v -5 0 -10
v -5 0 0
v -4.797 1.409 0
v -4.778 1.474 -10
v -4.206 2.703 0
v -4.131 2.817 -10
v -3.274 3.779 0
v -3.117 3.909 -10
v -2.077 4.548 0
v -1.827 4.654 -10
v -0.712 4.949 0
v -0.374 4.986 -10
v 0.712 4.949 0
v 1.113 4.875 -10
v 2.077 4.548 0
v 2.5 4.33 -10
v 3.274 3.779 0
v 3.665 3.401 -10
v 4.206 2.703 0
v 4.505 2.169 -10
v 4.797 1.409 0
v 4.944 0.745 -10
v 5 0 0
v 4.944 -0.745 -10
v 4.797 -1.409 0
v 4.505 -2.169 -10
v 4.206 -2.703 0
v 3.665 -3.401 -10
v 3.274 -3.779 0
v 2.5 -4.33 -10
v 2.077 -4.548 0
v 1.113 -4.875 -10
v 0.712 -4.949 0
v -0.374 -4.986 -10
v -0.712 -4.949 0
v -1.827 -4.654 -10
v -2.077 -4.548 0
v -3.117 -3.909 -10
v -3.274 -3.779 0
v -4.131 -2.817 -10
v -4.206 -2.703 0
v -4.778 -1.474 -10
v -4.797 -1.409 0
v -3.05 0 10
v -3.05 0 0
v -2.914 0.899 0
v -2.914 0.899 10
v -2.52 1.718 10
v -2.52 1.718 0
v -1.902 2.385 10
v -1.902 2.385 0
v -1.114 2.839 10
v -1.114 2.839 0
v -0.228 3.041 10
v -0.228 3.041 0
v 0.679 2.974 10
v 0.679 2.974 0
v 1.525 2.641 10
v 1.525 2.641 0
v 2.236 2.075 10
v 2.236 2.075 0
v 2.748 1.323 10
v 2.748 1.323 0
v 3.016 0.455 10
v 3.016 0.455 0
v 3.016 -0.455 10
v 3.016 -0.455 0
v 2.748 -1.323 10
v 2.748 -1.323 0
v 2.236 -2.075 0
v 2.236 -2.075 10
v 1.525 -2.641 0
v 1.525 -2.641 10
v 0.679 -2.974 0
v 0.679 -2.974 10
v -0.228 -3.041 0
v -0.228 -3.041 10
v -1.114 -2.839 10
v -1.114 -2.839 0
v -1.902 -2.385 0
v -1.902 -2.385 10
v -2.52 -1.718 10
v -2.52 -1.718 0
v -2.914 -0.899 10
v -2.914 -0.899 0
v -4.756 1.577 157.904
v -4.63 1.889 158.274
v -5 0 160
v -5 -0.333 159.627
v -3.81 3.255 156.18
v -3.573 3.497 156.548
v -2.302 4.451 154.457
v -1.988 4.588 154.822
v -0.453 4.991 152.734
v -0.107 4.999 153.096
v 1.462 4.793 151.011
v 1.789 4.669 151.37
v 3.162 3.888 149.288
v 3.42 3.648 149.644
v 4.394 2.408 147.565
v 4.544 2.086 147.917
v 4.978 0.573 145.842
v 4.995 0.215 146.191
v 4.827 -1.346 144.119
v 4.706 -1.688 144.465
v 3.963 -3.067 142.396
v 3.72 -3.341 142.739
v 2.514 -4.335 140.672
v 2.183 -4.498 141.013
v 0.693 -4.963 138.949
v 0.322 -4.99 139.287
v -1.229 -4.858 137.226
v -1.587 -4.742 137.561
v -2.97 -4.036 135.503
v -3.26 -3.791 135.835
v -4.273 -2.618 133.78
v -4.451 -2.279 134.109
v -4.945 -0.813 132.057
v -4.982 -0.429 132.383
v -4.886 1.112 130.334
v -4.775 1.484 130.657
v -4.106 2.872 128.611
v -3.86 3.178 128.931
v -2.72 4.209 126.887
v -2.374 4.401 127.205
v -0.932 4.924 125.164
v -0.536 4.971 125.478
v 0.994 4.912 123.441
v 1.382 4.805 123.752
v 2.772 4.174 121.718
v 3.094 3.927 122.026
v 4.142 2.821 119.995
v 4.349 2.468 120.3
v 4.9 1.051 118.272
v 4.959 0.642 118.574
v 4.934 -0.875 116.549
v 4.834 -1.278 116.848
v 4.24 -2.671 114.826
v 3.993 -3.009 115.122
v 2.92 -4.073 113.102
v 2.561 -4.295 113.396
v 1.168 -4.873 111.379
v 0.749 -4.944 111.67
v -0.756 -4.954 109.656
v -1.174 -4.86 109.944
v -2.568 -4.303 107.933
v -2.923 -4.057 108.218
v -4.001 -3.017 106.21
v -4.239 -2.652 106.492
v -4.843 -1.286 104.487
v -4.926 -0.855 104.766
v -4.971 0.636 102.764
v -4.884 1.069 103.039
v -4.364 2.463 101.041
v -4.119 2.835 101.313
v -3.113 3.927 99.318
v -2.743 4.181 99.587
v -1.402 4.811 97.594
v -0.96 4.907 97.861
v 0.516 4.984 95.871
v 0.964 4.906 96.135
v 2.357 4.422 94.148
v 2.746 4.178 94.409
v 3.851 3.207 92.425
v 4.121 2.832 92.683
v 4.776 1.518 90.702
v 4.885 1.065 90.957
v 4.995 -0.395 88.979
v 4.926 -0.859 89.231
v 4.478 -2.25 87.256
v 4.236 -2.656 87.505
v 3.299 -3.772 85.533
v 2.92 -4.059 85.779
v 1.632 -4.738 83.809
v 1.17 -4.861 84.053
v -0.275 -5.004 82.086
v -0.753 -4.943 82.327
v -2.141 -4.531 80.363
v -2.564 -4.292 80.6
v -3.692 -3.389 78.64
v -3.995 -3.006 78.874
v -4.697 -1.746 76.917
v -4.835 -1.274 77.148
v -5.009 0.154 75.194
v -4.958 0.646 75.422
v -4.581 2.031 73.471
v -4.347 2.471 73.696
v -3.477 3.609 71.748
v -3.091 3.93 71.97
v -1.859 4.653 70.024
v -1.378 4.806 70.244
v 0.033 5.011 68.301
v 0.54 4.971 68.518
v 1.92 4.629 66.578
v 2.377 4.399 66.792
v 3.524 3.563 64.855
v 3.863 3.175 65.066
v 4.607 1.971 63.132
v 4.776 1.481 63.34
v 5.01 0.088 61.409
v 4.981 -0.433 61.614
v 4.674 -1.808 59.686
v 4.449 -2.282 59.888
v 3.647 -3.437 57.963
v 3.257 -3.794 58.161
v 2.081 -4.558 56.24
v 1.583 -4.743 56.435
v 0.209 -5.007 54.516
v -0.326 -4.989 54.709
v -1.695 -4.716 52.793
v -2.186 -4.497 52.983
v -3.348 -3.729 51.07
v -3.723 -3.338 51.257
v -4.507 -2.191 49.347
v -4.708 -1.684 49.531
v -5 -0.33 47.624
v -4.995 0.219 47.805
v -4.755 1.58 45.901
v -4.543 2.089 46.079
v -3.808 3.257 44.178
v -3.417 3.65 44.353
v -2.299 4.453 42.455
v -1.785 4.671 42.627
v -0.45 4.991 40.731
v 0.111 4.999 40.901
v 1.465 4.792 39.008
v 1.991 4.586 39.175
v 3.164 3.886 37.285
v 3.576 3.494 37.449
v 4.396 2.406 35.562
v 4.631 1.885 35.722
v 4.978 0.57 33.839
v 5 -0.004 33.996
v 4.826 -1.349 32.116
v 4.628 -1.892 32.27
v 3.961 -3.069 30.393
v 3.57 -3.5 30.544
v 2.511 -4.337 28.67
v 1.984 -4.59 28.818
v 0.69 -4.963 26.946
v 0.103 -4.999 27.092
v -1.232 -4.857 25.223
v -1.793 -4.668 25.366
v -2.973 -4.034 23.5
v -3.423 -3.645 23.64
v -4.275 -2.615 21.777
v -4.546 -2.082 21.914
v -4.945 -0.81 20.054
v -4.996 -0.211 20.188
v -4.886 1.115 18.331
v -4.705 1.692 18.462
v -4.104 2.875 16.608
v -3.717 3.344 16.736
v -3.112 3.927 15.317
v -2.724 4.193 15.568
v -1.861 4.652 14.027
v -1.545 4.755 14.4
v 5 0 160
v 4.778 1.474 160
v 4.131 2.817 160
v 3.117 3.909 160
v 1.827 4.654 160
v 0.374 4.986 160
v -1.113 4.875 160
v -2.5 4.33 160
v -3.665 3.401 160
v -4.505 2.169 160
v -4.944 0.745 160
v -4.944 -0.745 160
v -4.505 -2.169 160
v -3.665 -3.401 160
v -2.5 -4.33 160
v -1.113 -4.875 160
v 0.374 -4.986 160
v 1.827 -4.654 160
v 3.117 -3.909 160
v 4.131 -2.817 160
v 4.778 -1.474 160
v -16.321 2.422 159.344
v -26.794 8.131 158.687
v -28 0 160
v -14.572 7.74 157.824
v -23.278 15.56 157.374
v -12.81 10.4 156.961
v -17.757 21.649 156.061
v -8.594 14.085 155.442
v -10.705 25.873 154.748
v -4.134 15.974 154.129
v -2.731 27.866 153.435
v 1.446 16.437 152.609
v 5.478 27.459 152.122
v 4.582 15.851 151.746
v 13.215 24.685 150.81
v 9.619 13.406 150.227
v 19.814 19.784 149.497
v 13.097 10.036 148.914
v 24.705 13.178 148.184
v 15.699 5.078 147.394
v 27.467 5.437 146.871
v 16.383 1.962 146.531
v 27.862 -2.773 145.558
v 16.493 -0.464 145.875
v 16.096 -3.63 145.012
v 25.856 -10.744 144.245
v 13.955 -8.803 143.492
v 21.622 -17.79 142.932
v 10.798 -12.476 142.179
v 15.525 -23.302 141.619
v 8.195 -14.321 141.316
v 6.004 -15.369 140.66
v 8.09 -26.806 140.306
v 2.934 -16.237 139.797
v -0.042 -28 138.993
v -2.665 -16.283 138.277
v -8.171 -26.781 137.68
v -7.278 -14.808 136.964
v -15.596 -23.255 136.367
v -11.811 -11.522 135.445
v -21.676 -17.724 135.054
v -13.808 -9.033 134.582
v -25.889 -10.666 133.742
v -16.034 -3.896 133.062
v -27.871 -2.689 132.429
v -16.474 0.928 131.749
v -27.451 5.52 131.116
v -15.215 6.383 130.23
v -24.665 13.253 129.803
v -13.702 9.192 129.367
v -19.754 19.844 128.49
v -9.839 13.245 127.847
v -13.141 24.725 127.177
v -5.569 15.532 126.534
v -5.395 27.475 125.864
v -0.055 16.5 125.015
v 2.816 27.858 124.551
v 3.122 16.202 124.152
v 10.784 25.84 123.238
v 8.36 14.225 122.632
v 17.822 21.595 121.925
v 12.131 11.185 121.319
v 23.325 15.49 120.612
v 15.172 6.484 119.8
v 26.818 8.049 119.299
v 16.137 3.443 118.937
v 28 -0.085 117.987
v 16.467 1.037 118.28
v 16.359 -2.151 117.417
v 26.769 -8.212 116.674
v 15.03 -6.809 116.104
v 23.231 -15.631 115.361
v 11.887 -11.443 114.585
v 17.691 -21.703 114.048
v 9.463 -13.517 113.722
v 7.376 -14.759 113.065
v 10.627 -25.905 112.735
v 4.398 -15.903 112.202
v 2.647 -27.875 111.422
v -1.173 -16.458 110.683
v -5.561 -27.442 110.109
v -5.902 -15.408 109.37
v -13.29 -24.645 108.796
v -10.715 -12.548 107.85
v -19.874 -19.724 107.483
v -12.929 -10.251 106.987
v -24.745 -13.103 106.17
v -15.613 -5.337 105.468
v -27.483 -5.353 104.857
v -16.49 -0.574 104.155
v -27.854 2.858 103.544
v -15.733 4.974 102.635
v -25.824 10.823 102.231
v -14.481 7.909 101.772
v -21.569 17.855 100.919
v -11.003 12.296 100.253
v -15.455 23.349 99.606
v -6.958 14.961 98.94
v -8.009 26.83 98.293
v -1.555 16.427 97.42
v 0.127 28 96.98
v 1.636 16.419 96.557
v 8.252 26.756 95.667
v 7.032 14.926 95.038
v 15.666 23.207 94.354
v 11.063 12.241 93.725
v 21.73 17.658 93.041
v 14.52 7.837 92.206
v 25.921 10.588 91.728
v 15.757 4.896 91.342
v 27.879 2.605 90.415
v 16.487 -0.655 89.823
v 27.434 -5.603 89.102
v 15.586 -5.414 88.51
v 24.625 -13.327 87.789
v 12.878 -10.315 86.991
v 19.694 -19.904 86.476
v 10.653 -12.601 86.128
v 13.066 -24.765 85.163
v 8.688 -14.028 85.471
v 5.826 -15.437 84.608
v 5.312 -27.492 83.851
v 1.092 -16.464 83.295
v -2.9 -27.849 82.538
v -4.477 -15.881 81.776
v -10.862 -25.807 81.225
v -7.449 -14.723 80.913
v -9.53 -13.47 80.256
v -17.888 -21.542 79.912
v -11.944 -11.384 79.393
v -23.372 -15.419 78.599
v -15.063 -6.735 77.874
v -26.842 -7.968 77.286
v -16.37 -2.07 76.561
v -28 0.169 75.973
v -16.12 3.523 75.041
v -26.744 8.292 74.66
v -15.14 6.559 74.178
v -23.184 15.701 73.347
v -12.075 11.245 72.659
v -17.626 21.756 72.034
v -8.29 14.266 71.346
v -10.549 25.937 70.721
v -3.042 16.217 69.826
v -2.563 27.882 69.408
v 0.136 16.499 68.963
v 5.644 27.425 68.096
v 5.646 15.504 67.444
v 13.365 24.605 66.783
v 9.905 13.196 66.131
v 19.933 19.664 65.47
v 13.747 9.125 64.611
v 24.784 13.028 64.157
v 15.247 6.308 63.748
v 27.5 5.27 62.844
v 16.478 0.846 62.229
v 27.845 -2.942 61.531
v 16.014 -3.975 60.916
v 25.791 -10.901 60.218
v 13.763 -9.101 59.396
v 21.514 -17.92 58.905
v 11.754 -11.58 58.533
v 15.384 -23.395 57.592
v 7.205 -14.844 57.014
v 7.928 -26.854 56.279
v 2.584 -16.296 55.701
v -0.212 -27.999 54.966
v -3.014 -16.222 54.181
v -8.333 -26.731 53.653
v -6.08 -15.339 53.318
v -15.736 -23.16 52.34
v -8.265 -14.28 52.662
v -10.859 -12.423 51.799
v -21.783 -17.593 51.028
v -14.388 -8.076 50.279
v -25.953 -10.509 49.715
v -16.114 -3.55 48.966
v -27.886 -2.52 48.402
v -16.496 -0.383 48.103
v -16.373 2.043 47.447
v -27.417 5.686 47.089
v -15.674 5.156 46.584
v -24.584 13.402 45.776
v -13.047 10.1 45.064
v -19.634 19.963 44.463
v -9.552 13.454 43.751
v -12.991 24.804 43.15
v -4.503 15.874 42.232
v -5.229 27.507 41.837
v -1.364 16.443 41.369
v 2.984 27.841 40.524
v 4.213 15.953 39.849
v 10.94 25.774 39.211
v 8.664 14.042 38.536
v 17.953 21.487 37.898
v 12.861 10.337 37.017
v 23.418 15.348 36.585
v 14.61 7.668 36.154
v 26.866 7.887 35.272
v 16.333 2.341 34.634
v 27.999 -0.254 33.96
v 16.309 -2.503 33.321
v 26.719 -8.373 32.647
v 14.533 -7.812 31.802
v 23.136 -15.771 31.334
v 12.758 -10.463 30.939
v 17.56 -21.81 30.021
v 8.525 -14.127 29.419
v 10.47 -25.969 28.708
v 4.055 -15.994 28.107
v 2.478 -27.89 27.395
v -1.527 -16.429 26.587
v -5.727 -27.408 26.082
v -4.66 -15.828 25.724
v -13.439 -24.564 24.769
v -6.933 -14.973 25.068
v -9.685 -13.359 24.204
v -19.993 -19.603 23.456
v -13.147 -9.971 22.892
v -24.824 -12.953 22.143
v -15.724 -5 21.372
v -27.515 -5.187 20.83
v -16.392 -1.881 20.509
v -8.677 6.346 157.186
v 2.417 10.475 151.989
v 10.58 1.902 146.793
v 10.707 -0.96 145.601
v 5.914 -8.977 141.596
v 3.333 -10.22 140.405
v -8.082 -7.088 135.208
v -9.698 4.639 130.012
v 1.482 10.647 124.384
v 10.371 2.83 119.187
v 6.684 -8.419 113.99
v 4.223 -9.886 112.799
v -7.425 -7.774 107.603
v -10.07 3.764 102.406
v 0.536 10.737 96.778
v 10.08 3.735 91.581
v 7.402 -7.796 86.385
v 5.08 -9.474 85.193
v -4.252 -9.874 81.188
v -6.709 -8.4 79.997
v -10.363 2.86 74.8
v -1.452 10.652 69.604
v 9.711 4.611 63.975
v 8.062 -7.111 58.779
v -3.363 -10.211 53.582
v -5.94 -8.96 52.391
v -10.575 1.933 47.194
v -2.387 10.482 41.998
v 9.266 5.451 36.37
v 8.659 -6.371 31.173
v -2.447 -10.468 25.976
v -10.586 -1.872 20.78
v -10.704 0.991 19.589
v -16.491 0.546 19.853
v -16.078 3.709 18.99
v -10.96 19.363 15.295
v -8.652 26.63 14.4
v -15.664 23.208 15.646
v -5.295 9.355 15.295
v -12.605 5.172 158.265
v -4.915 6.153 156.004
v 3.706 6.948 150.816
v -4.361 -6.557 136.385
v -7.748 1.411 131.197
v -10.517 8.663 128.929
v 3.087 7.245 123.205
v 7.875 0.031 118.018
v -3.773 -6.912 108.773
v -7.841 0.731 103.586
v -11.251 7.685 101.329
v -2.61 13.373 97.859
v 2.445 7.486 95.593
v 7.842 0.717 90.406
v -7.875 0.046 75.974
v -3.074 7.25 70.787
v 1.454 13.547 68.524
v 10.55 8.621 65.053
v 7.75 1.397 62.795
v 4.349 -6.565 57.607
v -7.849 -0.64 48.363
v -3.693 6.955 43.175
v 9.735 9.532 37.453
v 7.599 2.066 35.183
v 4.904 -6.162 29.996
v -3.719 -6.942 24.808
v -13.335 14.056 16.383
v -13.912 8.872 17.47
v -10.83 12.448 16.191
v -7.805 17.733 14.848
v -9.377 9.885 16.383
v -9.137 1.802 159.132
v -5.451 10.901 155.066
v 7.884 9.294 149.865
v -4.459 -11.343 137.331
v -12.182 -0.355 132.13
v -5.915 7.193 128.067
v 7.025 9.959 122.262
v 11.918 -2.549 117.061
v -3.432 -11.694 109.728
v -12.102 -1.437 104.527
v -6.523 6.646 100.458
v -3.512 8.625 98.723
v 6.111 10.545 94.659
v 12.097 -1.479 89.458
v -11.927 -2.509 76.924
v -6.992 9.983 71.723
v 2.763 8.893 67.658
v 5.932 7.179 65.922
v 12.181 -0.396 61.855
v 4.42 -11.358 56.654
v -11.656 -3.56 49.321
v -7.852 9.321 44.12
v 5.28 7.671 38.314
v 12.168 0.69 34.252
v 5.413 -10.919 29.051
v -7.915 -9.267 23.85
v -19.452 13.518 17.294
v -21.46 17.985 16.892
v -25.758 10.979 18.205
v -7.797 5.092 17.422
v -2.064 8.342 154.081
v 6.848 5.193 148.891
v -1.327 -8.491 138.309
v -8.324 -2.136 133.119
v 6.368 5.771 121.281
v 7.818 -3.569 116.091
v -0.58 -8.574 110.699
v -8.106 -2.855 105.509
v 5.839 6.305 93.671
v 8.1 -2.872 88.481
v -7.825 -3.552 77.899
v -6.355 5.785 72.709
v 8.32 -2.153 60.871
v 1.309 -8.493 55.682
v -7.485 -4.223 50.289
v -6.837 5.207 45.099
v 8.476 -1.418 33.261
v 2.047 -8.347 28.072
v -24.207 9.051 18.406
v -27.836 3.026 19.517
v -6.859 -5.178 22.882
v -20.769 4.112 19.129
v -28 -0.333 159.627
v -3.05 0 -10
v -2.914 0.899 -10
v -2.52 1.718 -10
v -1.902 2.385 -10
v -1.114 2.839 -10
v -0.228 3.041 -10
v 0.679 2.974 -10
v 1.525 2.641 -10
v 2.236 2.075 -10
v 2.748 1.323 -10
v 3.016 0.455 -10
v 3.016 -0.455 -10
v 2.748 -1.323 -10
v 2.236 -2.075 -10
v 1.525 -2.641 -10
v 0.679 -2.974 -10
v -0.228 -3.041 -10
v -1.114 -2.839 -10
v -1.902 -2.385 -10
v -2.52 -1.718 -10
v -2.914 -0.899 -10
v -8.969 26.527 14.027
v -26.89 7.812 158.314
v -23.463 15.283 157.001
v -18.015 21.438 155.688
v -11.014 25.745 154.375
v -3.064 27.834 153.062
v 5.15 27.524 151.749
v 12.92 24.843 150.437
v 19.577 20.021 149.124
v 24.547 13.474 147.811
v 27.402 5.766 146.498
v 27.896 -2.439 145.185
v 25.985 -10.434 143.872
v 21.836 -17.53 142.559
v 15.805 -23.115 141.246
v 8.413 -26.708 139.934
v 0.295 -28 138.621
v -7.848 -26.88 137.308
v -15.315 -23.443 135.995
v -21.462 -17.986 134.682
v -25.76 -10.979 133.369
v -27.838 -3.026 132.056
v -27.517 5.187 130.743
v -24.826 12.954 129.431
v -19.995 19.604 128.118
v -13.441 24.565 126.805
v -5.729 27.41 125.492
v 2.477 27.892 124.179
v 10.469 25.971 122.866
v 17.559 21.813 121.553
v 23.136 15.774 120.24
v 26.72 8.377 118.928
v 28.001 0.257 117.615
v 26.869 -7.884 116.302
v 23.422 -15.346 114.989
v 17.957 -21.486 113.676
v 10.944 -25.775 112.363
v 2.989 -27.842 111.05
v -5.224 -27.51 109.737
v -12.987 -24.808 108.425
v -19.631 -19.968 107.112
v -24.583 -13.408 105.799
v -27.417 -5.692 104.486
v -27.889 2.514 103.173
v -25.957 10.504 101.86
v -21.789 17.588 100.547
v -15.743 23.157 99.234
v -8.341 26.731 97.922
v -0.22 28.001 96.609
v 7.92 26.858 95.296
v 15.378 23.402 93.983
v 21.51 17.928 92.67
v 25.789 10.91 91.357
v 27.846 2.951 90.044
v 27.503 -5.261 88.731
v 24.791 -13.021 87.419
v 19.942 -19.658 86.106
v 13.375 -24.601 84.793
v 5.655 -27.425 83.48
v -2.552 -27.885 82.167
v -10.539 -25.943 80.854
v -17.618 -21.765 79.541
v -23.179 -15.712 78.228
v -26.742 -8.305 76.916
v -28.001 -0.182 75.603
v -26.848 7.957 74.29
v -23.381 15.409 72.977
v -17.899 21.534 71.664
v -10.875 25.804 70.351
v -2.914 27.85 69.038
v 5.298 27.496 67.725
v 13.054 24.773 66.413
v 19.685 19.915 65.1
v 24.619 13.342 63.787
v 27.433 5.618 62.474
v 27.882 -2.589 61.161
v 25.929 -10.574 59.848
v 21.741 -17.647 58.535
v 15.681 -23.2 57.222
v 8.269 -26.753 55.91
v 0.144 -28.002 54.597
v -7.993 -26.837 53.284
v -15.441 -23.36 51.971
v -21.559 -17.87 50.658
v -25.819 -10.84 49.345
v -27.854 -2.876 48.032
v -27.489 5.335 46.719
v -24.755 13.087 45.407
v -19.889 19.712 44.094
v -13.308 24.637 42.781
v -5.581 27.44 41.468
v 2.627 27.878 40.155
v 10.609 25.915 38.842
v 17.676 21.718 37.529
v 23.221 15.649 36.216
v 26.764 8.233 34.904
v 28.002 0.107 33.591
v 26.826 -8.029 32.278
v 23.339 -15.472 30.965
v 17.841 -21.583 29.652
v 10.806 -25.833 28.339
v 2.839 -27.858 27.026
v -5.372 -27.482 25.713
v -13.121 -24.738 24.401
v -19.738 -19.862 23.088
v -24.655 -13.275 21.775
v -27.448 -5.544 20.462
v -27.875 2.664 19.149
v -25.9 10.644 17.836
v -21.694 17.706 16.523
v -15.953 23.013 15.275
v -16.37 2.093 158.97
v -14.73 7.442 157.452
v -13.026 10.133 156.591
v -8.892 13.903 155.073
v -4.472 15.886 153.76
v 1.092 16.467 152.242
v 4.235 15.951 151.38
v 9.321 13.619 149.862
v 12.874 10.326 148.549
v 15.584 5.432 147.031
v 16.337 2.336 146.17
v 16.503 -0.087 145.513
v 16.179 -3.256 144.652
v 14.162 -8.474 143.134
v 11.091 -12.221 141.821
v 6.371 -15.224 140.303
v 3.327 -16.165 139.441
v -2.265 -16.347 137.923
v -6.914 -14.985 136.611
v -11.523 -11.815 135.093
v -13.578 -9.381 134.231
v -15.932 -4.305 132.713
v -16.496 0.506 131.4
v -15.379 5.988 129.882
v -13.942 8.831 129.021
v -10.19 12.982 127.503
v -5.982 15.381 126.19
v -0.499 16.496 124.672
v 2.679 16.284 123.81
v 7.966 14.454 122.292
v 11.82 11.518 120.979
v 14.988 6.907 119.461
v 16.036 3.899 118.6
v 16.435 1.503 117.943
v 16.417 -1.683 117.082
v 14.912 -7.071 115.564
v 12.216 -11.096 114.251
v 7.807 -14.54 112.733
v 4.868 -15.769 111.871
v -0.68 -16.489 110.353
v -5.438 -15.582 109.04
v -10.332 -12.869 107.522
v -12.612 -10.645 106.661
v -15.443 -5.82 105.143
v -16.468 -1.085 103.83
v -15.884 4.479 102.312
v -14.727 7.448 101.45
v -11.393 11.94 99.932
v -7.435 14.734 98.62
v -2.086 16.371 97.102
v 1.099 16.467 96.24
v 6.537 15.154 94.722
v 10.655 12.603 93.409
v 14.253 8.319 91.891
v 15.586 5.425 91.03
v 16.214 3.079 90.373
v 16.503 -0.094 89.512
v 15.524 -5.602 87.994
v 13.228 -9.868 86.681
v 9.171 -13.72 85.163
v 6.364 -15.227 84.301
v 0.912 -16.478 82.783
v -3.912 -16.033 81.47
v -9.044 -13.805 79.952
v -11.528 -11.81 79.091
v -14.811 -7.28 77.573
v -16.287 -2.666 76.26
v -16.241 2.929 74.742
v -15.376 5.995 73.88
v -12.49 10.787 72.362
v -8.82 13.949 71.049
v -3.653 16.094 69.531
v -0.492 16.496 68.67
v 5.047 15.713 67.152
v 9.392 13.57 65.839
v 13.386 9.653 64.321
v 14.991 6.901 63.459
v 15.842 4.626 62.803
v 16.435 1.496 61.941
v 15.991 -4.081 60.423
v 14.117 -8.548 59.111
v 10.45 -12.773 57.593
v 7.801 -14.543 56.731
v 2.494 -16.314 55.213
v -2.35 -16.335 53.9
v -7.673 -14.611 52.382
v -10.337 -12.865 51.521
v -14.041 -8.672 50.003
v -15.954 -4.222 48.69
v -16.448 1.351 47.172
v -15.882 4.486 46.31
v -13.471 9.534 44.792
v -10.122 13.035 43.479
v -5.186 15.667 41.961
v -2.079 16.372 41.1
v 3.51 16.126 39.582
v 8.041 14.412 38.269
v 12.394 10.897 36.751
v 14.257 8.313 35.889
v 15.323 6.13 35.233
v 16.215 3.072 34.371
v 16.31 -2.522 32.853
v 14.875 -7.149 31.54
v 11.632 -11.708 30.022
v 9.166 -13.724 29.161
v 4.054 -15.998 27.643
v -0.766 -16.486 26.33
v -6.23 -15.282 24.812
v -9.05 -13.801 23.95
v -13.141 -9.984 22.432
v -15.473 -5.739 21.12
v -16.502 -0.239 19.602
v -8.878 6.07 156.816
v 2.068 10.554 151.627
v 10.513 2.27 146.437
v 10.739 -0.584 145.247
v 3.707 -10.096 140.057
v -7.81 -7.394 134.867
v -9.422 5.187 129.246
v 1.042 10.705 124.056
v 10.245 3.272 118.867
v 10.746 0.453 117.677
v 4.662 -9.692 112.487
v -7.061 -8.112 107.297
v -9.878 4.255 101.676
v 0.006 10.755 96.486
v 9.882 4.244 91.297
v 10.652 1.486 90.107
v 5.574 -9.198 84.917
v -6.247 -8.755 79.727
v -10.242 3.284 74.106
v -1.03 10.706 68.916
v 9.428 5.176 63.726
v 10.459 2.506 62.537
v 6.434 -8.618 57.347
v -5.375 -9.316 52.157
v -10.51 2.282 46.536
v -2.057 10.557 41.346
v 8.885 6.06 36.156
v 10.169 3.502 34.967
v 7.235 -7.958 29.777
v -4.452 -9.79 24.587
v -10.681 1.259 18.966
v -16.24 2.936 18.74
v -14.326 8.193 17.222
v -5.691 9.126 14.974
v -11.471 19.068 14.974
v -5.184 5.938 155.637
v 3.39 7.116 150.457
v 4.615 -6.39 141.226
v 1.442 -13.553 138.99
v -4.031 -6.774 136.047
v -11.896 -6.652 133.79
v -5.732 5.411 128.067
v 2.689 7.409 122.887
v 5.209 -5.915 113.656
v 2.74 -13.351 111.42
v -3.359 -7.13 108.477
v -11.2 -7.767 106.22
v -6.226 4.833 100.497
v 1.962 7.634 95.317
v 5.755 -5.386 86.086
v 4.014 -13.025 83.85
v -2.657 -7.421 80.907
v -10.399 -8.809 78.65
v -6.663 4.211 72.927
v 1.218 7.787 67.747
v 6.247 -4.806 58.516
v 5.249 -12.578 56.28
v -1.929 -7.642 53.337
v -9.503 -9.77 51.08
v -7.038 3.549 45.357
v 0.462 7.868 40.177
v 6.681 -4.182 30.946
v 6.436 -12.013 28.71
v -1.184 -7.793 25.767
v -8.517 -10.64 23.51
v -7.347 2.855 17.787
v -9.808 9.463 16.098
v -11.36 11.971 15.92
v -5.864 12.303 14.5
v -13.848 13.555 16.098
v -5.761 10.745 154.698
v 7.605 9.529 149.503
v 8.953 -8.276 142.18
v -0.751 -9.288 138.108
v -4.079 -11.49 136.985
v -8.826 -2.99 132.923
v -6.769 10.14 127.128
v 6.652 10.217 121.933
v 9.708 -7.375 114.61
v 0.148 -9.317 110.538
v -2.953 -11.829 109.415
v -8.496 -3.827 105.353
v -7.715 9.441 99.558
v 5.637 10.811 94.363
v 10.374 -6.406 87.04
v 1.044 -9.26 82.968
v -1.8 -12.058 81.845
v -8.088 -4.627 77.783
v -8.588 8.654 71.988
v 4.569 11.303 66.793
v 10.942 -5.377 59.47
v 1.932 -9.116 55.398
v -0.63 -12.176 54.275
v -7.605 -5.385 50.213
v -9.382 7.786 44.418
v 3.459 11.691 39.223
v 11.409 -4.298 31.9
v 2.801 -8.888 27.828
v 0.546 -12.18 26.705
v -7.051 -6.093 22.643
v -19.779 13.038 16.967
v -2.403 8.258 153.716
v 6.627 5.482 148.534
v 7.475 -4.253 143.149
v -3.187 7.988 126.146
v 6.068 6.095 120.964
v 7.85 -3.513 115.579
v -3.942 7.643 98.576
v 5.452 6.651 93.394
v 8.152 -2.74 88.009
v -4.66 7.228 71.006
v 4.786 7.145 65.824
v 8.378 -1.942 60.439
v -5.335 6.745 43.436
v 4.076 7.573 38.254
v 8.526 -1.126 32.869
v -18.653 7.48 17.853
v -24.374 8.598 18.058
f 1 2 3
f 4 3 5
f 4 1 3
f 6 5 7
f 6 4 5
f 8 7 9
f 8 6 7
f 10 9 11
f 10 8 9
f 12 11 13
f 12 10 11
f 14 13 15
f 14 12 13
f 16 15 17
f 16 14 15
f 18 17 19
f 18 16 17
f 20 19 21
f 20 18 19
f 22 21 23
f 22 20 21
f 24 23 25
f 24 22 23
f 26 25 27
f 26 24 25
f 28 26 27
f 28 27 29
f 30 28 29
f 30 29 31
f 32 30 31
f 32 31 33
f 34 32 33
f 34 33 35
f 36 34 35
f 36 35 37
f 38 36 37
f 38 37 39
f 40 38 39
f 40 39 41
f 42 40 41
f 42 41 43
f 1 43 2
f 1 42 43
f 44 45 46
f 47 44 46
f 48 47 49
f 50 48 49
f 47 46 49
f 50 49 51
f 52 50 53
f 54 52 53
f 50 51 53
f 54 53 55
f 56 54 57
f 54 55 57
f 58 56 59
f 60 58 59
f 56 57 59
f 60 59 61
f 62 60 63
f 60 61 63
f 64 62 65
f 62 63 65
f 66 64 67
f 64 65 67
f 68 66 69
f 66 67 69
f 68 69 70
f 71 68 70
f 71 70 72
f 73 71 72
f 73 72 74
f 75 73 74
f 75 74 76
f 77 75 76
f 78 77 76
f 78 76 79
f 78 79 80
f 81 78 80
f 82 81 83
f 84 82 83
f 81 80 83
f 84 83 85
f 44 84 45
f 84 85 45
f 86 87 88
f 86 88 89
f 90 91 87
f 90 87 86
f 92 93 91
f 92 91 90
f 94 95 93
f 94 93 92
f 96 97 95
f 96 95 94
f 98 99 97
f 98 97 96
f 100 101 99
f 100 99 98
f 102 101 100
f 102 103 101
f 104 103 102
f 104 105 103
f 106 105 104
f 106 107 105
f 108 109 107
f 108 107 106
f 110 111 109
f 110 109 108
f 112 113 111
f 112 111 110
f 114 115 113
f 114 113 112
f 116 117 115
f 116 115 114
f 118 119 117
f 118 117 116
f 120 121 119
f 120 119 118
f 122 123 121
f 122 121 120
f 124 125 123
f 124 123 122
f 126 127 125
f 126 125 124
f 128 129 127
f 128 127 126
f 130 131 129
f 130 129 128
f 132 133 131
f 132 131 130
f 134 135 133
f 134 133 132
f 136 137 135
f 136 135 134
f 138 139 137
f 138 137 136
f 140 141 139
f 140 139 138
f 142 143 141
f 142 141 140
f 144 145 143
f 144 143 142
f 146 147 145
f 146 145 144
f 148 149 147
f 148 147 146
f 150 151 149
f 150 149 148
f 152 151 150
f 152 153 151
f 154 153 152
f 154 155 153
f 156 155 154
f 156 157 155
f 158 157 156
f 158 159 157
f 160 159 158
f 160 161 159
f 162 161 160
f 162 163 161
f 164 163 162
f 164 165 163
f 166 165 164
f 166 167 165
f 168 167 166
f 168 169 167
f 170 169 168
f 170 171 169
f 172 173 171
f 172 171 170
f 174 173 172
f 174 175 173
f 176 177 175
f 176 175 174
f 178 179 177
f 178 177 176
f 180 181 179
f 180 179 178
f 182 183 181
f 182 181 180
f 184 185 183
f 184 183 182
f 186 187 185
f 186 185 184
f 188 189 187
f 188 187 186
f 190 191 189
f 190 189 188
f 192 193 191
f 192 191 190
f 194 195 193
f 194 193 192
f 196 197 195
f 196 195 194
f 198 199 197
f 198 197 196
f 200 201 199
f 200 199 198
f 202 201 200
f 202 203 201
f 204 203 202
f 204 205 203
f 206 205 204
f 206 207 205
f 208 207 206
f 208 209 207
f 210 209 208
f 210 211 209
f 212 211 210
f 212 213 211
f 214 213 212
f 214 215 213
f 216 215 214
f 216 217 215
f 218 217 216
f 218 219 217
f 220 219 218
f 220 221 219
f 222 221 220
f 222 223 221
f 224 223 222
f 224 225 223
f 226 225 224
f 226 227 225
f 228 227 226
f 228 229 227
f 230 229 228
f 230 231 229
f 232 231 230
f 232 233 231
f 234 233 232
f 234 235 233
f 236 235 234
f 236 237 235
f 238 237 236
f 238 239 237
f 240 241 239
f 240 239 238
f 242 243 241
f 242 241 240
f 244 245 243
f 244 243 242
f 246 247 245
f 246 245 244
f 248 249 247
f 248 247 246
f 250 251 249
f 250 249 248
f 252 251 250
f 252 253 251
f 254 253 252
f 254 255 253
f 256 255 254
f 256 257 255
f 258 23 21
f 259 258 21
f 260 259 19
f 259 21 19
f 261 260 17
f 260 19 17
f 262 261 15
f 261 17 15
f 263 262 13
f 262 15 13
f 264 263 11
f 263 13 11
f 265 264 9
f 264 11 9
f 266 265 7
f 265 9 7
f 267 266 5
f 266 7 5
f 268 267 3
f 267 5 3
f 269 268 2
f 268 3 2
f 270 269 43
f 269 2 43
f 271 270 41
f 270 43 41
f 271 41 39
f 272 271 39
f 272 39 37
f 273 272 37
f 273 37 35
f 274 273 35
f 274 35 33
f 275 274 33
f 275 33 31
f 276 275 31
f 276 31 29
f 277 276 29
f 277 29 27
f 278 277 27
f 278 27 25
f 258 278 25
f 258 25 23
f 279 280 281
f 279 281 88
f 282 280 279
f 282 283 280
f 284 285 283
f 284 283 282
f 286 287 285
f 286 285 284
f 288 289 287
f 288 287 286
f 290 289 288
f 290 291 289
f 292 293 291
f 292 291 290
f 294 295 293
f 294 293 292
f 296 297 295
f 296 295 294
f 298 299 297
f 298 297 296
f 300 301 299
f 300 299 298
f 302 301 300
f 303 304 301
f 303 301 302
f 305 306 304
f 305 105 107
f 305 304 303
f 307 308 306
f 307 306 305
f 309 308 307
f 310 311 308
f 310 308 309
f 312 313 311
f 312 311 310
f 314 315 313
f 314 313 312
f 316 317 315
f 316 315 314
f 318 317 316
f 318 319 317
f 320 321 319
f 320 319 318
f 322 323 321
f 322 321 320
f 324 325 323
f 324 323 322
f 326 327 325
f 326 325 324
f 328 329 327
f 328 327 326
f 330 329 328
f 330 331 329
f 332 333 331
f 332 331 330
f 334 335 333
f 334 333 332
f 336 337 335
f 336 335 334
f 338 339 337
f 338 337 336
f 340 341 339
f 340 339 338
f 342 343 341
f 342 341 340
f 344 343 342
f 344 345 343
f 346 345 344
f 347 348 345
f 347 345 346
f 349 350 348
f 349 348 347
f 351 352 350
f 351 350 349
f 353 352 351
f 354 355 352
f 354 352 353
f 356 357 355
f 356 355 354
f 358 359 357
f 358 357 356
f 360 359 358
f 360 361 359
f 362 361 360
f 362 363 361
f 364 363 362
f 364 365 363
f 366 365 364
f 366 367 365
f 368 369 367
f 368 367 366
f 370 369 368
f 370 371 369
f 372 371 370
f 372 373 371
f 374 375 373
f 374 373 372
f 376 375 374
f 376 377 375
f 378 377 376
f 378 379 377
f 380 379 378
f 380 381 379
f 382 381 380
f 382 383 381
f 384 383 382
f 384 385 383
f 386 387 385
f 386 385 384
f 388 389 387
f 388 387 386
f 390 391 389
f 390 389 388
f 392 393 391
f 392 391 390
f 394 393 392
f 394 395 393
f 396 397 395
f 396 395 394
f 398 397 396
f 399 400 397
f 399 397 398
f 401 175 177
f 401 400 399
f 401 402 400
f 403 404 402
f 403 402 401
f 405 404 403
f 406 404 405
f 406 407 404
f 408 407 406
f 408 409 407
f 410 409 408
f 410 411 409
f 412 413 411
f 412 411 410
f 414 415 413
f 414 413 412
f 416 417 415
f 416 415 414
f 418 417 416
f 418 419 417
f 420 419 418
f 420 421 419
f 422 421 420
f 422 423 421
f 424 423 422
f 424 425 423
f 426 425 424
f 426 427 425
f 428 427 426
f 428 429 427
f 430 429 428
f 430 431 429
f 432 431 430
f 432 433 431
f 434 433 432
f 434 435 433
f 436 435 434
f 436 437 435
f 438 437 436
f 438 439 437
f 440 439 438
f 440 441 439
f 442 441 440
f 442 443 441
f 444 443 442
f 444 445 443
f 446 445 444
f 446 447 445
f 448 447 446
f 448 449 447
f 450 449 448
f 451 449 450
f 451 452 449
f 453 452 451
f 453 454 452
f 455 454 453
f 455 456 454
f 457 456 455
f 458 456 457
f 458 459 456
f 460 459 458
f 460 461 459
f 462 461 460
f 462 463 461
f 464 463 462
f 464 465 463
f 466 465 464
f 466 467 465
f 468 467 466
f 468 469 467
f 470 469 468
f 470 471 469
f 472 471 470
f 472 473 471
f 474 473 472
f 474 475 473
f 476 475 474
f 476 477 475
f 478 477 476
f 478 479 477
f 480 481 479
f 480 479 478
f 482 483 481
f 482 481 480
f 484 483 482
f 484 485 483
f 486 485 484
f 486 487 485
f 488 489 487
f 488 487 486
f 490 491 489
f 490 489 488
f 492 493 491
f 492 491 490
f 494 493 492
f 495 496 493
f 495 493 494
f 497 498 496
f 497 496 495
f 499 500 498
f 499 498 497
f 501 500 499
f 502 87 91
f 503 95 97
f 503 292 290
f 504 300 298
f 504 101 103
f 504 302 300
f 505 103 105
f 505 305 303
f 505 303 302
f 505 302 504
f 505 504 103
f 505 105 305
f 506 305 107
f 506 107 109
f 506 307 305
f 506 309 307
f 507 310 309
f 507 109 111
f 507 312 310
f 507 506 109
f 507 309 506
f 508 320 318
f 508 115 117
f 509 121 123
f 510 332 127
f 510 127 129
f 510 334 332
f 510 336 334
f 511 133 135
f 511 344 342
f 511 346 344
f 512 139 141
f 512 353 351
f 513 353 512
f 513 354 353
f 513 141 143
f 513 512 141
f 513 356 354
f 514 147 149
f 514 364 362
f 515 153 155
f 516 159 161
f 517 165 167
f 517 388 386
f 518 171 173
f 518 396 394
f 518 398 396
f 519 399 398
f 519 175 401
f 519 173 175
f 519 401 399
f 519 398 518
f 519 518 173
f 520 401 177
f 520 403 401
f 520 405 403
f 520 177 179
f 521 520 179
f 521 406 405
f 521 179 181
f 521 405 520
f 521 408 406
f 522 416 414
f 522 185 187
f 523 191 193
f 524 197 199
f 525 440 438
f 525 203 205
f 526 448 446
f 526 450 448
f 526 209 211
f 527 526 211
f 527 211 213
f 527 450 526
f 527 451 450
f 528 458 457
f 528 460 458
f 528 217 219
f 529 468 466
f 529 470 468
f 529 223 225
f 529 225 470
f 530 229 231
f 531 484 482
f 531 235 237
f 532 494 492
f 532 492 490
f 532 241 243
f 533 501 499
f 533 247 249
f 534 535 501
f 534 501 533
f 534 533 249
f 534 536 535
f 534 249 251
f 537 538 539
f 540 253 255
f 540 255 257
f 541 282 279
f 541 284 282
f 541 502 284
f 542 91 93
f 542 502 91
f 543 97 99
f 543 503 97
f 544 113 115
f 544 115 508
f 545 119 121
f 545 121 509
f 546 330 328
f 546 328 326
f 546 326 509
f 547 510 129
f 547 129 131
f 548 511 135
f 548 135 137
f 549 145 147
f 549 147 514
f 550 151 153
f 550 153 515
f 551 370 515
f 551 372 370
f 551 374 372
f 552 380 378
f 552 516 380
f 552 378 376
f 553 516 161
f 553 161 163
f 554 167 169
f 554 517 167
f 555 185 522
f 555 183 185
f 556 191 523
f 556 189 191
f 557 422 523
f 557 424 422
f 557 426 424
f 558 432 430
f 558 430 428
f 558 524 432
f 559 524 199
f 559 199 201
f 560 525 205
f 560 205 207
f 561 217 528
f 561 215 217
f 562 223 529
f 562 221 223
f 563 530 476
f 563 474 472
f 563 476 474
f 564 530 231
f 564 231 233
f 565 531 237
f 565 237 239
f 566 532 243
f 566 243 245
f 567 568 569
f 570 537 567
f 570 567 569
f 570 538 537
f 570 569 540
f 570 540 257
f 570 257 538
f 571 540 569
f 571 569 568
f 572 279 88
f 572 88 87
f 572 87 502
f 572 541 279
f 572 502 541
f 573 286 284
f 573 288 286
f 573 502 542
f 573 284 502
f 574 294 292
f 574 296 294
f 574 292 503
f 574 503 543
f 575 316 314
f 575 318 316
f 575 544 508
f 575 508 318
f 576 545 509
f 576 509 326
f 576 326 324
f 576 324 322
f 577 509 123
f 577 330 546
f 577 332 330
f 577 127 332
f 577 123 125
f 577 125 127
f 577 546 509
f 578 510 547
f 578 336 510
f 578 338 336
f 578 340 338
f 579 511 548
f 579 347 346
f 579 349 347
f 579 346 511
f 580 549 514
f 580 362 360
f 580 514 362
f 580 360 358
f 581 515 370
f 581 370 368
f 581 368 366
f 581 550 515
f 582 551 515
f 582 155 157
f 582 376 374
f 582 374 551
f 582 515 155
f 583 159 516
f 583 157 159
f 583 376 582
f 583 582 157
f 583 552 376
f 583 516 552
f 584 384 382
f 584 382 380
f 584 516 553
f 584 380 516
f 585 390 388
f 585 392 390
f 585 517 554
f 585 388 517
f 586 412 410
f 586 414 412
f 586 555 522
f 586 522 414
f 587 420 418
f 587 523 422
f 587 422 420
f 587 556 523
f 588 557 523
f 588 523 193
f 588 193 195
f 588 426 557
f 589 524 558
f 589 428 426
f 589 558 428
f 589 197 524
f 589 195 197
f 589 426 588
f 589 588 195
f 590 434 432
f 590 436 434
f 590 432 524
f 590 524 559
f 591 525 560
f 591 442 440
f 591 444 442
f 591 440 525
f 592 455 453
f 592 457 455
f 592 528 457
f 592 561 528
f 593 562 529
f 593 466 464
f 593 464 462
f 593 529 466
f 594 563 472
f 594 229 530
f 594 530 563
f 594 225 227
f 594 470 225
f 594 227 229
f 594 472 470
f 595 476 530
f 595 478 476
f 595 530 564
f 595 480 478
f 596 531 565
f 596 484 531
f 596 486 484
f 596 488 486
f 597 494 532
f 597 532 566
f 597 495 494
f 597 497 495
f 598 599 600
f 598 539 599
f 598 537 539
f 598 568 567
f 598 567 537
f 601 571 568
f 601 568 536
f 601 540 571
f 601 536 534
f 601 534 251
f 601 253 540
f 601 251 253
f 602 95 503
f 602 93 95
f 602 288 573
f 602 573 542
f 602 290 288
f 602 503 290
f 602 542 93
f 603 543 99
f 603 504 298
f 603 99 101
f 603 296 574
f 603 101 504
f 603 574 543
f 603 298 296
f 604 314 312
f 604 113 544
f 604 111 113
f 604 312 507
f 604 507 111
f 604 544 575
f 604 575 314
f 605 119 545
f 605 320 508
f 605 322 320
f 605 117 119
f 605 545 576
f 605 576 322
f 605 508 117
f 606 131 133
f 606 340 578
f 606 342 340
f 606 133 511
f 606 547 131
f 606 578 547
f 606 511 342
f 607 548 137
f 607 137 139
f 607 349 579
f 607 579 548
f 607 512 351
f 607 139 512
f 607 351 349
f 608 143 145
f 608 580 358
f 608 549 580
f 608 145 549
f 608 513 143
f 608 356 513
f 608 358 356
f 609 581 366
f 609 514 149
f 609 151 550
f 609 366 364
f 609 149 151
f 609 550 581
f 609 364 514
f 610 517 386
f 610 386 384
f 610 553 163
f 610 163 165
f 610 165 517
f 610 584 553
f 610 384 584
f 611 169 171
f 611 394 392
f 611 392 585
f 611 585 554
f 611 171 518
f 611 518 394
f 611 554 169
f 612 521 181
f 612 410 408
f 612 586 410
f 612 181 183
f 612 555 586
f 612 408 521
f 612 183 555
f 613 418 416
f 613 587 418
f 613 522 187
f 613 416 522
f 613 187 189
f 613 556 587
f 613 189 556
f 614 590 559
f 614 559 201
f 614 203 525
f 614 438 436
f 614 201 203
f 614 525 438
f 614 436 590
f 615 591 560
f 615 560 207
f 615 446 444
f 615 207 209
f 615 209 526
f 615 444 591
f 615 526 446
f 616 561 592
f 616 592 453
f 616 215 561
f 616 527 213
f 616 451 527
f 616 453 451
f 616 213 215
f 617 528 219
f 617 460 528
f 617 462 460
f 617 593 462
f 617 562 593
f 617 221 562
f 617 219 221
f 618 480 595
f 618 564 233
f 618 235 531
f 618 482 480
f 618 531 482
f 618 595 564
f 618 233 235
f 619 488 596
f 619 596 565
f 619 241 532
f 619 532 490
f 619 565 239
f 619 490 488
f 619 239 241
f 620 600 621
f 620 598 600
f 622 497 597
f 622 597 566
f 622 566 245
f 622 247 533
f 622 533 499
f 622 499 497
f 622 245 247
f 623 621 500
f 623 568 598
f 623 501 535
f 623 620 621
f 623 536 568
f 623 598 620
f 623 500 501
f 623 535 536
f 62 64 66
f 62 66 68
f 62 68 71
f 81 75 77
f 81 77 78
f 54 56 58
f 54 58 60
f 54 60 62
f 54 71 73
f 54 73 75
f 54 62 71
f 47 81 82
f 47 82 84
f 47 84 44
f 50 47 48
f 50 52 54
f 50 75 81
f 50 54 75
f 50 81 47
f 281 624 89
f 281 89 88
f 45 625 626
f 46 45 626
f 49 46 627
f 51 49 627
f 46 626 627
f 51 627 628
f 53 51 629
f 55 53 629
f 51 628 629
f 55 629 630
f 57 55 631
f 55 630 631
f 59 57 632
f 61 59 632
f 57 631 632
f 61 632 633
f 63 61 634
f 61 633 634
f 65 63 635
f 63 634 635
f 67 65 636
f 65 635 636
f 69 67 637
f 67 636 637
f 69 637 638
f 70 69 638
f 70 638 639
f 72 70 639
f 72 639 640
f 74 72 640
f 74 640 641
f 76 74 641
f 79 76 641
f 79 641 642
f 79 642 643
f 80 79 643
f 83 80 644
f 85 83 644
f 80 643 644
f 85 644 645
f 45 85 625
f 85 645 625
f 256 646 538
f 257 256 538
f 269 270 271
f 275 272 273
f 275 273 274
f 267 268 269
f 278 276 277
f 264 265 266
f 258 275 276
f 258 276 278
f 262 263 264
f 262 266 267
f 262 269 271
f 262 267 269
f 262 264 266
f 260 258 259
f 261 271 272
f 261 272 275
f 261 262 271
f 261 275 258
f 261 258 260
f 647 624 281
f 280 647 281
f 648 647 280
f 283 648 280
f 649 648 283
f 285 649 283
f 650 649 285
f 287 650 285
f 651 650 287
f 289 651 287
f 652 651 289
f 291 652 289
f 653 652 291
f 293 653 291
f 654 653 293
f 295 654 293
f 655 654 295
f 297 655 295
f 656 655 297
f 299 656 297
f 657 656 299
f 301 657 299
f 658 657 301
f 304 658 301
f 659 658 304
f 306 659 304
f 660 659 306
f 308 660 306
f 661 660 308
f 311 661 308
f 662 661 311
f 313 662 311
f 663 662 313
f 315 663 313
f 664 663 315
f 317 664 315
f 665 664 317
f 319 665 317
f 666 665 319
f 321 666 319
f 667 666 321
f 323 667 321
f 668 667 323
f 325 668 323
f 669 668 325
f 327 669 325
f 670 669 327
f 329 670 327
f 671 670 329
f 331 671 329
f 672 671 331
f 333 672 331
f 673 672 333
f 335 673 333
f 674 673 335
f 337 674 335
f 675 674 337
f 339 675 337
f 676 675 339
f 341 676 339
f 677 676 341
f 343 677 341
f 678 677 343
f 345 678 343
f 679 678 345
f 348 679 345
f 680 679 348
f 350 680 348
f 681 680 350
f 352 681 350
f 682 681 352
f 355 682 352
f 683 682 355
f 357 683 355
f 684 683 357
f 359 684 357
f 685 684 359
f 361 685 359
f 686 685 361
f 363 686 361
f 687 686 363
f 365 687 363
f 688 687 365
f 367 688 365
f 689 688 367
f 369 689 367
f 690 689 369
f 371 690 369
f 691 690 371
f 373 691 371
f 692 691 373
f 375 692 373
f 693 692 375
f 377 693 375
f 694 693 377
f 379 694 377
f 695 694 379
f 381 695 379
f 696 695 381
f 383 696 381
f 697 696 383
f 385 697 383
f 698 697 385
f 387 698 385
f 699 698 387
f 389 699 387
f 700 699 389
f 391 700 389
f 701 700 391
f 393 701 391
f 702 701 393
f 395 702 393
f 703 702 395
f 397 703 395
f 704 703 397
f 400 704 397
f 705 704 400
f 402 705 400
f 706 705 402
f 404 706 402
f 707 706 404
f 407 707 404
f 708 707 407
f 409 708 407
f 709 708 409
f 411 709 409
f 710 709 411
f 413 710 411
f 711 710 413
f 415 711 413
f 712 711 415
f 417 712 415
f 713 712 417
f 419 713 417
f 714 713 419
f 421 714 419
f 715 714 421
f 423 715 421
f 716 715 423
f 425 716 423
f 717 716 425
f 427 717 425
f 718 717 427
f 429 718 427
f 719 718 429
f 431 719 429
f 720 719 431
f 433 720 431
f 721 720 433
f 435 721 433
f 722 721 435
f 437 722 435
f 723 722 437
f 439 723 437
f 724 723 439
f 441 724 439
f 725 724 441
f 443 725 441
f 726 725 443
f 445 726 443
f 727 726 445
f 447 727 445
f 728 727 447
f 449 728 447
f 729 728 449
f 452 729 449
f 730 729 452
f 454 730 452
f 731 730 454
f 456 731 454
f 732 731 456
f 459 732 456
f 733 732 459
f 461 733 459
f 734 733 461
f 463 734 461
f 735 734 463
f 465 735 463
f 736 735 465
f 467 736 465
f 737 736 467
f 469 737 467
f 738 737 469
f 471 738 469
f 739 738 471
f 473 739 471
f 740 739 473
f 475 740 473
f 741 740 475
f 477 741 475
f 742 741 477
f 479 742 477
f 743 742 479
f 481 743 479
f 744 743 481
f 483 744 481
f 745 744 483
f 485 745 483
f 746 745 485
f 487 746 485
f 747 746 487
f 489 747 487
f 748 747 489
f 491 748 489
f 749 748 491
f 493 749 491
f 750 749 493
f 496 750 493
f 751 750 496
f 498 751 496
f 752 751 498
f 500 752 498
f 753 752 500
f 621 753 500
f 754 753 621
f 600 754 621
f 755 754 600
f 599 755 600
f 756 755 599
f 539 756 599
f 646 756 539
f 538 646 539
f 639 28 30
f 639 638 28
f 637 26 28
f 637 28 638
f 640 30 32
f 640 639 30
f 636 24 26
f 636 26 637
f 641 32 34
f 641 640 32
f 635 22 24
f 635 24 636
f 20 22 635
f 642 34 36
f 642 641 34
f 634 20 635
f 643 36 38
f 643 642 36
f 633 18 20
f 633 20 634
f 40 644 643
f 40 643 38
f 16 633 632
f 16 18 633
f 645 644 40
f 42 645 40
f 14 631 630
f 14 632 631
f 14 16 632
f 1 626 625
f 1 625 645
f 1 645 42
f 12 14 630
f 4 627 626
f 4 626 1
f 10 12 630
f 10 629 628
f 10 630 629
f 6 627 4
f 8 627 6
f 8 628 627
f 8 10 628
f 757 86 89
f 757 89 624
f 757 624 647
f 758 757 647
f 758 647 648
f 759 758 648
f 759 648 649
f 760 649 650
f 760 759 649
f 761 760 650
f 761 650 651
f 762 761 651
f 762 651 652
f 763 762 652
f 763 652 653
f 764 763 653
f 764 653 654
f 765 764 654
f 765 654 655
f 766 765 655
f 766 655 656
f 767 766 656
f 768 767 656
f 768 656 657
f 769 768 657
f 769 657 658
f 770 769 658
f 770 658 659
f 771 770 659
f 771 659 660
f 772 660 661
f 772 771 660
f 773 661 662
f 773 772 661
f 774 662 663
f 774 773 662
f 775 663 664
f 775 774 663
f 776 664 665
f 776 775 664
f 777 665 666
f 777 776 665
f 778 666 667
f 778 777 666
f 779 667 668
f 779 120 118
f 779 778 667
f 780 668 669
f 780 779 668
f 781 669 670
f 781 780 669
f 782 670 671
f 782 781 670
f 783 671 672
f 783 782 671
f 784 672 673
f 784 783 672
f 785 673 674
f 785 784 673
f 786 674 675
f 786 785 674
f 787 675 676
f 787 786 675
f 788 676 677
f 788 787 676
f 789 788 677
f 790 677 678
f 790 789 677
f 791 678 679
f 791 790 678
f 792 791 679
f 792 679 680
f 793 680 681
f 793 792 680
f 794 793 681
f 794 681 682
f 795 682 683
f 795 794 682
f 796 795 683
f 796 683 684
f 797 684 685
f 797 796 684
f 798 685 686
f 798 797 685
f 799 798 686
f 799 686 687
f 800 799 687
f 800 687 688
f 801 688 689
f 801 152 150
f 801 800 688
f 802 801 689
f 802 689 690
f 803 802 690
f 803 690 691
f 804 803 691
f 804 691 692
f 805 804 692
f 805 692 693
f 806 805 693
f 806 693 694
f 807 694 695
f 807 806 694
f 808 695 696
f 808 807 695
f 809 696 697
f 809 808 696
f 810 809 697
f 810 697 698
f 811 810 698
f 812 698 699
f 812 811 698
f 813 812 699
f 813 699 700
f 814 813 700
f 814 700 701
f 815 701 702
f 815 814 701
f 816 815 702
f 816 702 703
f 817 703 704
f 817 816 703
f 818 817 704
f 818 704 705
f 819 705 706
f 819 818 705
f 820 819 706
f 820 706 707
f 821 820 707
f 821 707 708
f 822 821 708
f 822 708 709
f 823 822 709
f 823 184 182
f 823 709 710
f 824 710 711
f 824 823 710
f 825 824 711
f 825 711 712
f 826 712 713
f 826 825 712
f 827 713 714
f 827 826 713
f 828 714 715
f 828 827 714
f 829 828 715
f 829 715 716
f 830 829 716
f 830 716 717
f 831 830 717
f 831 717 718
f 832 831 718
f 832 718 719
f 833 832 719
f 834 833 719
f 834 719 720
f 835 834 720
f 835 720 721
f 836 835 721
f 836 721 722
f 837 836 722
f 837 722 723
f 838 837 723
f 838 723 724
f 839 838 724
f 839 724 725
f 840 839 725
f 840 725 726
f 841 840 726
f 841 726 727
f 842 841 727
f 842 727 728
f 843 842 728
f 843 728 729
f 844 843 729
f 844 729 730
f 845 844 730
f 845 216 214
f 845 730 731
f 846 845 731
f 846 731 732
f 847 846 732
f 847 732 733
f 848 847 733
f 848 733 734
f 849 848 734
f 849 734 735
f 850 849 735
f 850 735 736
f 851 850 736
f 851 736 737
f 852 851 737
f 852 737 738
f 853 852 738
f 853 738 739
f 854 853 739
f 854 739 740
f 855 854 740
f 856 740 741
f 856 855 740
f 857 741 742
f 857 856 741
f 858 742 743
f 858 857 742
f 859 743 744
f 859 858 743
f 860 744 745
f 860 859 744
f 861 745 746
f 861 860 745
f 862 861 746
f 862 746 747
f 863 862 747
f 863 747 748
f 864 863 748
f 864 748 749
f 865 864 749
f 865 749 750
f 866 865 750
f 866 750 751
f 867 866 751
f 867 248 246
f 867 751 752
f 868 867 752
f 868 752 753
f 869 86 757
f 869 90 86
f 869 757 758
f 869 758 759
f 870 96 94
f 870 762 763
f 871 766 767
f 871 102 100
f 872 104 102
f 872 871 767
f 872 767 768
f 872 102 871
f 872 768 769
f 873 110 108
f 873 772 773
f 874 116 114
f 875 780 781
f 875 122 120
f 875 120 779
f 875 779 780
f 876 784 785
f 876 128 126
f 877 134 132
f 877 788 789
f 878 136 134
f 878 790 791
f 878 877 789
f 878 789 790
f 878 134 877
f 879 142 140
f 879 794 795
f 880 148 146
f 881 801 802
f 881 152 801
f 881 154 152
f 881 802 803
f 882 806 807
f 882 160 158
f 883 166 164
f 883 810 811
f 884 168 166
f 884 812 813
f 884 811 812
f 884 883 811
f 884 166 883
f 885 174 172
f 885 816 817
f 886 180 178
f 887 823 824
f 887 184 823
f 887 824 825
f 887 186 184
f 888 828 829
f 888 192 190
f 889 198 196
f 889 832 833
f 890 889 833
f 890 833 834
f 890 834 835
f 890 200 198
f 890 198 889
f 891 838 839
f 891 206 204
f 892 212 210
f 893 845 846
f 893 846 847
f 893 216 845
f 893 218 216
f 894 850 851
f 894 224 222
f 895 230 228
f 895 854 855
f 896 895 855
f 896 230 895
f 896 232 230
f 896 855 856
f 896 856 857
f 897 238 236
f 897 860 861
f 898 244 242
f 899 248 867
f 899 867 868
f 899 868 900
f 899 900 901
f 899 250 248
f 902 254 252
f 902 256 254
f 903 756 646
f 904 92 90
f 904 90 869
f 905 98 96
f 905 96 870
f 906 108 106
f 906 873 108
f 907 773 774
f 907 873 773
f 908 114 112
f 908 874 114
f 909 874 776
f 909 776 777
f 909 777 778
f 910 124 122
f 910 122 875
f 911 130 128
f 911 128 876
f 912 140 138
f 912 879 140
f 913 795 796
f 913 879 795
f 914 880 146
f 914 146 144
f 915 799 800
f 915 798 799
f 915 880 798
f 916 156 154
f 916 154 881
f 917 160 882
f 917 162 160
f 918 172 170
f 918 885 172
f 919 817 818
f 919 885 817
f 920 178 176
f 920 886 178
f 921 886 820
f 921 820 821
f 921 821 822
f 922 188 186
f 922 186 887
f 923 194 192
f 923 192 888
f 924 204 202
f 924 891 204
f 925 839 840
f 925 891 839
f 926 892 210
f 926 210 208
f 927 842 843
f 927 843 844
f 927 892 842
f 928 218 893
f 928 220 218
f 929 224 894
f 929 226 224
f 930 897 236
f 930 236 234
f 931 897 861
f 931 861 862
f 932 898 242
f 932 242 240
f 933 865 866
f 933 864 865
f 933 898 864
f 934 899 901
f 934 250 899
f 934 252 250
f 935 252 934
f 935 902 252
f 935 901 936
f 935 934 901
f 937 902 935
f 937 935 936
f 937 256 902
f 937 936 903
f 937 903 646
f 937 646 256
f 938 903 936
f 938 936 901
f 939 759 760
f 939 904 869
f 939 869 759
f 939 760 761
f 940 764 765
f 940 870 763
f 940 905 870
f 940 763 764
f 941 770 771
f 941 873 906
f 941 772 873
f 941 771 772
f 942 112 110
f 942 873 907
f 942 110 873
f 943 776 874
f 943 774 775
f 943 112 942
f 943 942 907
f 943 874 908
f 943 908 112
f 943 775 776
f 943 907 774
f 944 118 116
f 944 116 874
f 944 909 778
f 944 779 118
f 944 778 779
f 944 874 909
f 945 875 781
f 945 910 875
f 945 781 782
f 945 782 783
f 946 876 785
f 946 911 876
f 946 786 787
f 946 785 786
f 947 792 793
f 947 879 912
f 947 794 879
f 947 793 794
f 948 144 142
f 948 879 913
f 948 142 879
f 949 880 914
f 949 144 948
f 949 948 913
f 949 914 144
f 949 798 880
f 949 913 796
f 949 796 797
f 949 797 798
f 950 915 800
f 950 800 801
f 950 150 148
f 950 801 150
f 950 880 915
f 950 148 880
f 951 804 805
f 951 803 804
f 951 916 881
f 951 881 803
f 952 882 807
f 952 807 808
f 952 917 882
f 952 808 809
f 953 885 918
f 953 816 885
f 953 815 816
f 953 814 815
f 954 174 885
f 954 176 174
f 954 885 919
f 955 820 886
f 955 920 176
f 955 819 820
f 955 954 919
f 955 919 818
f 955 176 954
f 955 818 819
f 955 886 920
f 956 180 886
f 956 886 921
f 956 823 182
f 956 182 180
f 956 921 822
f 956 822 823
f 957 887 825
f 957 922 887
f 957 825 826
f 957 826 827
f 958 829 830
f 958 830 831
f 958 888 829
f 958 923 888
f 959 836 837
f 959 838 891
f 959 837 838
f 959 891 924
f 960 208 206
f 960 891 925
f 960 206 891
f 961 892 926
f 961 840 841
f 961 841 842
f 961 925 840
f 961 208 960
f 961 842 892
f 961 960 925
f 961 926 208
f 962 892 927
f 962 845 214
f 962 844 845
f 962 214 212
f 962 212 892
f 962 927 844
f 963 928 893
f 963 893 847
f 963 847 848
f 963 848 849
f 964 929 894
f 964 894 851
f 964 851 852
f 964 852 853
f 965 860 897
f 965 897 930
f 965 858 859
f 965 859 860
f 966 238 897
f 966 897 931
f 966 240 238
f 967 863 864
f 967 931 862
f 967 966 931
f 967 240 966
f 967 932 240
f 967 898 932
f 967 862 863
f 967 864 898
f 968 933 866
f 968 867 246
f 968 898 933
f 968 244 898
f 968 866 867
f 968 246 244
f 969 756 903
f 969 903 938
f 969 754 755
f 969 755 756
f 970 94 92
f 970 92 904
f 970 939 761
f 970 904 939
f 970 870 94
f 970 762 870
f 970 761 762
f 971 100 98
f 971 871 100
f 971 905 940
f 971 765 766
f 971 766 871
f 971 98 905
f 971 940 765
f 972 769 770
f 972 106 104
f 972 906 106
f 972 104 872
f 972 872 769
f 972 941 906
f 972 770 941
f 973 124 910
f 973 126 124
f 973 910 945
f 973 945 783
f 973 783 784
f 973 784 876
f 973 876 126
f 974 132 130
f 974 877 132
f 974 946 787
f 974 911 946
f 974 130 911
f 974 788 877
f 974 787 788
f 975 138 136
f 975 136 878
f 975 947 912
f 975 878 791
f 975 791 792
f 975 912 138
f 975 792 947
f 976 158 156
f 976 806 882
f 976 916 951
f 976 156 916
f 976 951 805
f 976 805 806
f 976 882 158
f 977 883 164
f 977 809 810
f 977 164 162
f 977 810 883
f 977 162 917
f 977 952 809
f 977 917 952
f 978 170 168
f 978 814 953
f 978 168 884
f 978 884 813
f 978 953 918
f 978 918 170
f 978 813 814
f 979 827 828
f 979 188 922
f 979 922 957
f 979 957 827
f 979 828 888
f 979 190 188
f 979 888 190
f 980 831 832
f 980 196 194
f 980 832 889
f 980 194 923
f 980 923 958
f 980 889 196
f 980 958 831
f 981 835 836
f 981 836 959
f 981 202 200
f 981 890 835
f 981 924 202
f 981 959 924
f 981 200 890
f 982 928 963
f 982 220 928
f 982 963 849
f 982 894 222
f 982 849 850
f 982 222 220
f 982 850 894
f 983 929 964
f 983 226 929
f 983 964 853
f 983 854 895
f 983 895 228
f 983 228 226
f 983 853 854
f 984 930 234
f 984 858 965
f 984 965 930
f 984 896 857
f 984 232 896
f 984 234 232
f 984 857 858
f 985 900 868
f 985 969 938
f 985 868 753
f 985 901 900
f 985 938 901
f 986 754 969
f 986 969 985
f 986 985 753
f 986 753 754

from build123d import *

# Parameters (mm, degrees)
CROQUIS1_R              = 5
SALIENTE_EXTRUIR1_DEPTH = 160
BARRER1_PITCH           = 28
BARRER1_HEIGHT          = 145.6
BARRER1_RADIUS          = 5
CROQUIS3_W              = 23
CROQUIS3_H              = 0.5
CROQUIS4_R              = 3.05
CORTAR_EXTRUIR1_DEPTH   = 10
SALIENTE_EXTRUIR2_START = 10
CROQUIS6_R              = 5
CROQUIS6_R_2            = 3.05
SALIENTE_EXTRUIR2_DEPTH = 10


with BuildPart() as part:
    # Croquis1 → Saliente-Extruir1 (new body)
    with BuildSketch(Plane.XY):
        Circle(CROQUIS1_R)
    extrude(amount=SALIENTE_EXTRUIR1_DEPTH)

    # Croquis4 → Cortar-Extruir1 (cut)
    with BuildSketch(Plane(origin=(0, 0, 0), x_dir=(-1, 0, 0), z_dir=(0, 0, -1))):
        Circle(CROQUIS4_R)
    extrude(amount=-CORTAR_EXTRUIR1_DEPTH, mode=Mode.SUBTRACT)

    # Croquis6 → Saliente-Extruir2 (add)
    with BuildSketch(Plane(origin=(0, 0, 0), x_dir=(-1, 0, 0), z_dir=(0, 0, -1)).offset(SALIENTE_EXTRUIR2_START)):
        Circle(CROQUIS6_R)
        Circle(CROQUIS6_R_2, mode=Mode.SUBTRACT)
    extrude(amount=-SALIENTE_EXTRUIR2_DEPTH)


with BuildPart() as body_2:
    # Barrer1: sweep along a helix
    with BuildLine() as barrer1_path:
        Helix(BARRER1_PITCH, BARRER1_HEIGHT, BARRER1_RADIUS, center=(0, 0, 160), direction=(0, 0, -1))
    # Croquis3 → Barrer1 (sweep)
    with BuildSketch(Plane(origin=(-5, 0, 160), x_dir=(1, 0, 0), z_dir=(-4.925203738521749e-15, 0.746526867675461, -0.6653552703921906))):
        with Locations((-11.5, 0.25)):
            Rectangle(CROQUIS3_W, CROQUIS3_H)
    sweep(path=barrer1_path.line, is_frenet=True)


solid = Compound([part.part, body_2.part])
